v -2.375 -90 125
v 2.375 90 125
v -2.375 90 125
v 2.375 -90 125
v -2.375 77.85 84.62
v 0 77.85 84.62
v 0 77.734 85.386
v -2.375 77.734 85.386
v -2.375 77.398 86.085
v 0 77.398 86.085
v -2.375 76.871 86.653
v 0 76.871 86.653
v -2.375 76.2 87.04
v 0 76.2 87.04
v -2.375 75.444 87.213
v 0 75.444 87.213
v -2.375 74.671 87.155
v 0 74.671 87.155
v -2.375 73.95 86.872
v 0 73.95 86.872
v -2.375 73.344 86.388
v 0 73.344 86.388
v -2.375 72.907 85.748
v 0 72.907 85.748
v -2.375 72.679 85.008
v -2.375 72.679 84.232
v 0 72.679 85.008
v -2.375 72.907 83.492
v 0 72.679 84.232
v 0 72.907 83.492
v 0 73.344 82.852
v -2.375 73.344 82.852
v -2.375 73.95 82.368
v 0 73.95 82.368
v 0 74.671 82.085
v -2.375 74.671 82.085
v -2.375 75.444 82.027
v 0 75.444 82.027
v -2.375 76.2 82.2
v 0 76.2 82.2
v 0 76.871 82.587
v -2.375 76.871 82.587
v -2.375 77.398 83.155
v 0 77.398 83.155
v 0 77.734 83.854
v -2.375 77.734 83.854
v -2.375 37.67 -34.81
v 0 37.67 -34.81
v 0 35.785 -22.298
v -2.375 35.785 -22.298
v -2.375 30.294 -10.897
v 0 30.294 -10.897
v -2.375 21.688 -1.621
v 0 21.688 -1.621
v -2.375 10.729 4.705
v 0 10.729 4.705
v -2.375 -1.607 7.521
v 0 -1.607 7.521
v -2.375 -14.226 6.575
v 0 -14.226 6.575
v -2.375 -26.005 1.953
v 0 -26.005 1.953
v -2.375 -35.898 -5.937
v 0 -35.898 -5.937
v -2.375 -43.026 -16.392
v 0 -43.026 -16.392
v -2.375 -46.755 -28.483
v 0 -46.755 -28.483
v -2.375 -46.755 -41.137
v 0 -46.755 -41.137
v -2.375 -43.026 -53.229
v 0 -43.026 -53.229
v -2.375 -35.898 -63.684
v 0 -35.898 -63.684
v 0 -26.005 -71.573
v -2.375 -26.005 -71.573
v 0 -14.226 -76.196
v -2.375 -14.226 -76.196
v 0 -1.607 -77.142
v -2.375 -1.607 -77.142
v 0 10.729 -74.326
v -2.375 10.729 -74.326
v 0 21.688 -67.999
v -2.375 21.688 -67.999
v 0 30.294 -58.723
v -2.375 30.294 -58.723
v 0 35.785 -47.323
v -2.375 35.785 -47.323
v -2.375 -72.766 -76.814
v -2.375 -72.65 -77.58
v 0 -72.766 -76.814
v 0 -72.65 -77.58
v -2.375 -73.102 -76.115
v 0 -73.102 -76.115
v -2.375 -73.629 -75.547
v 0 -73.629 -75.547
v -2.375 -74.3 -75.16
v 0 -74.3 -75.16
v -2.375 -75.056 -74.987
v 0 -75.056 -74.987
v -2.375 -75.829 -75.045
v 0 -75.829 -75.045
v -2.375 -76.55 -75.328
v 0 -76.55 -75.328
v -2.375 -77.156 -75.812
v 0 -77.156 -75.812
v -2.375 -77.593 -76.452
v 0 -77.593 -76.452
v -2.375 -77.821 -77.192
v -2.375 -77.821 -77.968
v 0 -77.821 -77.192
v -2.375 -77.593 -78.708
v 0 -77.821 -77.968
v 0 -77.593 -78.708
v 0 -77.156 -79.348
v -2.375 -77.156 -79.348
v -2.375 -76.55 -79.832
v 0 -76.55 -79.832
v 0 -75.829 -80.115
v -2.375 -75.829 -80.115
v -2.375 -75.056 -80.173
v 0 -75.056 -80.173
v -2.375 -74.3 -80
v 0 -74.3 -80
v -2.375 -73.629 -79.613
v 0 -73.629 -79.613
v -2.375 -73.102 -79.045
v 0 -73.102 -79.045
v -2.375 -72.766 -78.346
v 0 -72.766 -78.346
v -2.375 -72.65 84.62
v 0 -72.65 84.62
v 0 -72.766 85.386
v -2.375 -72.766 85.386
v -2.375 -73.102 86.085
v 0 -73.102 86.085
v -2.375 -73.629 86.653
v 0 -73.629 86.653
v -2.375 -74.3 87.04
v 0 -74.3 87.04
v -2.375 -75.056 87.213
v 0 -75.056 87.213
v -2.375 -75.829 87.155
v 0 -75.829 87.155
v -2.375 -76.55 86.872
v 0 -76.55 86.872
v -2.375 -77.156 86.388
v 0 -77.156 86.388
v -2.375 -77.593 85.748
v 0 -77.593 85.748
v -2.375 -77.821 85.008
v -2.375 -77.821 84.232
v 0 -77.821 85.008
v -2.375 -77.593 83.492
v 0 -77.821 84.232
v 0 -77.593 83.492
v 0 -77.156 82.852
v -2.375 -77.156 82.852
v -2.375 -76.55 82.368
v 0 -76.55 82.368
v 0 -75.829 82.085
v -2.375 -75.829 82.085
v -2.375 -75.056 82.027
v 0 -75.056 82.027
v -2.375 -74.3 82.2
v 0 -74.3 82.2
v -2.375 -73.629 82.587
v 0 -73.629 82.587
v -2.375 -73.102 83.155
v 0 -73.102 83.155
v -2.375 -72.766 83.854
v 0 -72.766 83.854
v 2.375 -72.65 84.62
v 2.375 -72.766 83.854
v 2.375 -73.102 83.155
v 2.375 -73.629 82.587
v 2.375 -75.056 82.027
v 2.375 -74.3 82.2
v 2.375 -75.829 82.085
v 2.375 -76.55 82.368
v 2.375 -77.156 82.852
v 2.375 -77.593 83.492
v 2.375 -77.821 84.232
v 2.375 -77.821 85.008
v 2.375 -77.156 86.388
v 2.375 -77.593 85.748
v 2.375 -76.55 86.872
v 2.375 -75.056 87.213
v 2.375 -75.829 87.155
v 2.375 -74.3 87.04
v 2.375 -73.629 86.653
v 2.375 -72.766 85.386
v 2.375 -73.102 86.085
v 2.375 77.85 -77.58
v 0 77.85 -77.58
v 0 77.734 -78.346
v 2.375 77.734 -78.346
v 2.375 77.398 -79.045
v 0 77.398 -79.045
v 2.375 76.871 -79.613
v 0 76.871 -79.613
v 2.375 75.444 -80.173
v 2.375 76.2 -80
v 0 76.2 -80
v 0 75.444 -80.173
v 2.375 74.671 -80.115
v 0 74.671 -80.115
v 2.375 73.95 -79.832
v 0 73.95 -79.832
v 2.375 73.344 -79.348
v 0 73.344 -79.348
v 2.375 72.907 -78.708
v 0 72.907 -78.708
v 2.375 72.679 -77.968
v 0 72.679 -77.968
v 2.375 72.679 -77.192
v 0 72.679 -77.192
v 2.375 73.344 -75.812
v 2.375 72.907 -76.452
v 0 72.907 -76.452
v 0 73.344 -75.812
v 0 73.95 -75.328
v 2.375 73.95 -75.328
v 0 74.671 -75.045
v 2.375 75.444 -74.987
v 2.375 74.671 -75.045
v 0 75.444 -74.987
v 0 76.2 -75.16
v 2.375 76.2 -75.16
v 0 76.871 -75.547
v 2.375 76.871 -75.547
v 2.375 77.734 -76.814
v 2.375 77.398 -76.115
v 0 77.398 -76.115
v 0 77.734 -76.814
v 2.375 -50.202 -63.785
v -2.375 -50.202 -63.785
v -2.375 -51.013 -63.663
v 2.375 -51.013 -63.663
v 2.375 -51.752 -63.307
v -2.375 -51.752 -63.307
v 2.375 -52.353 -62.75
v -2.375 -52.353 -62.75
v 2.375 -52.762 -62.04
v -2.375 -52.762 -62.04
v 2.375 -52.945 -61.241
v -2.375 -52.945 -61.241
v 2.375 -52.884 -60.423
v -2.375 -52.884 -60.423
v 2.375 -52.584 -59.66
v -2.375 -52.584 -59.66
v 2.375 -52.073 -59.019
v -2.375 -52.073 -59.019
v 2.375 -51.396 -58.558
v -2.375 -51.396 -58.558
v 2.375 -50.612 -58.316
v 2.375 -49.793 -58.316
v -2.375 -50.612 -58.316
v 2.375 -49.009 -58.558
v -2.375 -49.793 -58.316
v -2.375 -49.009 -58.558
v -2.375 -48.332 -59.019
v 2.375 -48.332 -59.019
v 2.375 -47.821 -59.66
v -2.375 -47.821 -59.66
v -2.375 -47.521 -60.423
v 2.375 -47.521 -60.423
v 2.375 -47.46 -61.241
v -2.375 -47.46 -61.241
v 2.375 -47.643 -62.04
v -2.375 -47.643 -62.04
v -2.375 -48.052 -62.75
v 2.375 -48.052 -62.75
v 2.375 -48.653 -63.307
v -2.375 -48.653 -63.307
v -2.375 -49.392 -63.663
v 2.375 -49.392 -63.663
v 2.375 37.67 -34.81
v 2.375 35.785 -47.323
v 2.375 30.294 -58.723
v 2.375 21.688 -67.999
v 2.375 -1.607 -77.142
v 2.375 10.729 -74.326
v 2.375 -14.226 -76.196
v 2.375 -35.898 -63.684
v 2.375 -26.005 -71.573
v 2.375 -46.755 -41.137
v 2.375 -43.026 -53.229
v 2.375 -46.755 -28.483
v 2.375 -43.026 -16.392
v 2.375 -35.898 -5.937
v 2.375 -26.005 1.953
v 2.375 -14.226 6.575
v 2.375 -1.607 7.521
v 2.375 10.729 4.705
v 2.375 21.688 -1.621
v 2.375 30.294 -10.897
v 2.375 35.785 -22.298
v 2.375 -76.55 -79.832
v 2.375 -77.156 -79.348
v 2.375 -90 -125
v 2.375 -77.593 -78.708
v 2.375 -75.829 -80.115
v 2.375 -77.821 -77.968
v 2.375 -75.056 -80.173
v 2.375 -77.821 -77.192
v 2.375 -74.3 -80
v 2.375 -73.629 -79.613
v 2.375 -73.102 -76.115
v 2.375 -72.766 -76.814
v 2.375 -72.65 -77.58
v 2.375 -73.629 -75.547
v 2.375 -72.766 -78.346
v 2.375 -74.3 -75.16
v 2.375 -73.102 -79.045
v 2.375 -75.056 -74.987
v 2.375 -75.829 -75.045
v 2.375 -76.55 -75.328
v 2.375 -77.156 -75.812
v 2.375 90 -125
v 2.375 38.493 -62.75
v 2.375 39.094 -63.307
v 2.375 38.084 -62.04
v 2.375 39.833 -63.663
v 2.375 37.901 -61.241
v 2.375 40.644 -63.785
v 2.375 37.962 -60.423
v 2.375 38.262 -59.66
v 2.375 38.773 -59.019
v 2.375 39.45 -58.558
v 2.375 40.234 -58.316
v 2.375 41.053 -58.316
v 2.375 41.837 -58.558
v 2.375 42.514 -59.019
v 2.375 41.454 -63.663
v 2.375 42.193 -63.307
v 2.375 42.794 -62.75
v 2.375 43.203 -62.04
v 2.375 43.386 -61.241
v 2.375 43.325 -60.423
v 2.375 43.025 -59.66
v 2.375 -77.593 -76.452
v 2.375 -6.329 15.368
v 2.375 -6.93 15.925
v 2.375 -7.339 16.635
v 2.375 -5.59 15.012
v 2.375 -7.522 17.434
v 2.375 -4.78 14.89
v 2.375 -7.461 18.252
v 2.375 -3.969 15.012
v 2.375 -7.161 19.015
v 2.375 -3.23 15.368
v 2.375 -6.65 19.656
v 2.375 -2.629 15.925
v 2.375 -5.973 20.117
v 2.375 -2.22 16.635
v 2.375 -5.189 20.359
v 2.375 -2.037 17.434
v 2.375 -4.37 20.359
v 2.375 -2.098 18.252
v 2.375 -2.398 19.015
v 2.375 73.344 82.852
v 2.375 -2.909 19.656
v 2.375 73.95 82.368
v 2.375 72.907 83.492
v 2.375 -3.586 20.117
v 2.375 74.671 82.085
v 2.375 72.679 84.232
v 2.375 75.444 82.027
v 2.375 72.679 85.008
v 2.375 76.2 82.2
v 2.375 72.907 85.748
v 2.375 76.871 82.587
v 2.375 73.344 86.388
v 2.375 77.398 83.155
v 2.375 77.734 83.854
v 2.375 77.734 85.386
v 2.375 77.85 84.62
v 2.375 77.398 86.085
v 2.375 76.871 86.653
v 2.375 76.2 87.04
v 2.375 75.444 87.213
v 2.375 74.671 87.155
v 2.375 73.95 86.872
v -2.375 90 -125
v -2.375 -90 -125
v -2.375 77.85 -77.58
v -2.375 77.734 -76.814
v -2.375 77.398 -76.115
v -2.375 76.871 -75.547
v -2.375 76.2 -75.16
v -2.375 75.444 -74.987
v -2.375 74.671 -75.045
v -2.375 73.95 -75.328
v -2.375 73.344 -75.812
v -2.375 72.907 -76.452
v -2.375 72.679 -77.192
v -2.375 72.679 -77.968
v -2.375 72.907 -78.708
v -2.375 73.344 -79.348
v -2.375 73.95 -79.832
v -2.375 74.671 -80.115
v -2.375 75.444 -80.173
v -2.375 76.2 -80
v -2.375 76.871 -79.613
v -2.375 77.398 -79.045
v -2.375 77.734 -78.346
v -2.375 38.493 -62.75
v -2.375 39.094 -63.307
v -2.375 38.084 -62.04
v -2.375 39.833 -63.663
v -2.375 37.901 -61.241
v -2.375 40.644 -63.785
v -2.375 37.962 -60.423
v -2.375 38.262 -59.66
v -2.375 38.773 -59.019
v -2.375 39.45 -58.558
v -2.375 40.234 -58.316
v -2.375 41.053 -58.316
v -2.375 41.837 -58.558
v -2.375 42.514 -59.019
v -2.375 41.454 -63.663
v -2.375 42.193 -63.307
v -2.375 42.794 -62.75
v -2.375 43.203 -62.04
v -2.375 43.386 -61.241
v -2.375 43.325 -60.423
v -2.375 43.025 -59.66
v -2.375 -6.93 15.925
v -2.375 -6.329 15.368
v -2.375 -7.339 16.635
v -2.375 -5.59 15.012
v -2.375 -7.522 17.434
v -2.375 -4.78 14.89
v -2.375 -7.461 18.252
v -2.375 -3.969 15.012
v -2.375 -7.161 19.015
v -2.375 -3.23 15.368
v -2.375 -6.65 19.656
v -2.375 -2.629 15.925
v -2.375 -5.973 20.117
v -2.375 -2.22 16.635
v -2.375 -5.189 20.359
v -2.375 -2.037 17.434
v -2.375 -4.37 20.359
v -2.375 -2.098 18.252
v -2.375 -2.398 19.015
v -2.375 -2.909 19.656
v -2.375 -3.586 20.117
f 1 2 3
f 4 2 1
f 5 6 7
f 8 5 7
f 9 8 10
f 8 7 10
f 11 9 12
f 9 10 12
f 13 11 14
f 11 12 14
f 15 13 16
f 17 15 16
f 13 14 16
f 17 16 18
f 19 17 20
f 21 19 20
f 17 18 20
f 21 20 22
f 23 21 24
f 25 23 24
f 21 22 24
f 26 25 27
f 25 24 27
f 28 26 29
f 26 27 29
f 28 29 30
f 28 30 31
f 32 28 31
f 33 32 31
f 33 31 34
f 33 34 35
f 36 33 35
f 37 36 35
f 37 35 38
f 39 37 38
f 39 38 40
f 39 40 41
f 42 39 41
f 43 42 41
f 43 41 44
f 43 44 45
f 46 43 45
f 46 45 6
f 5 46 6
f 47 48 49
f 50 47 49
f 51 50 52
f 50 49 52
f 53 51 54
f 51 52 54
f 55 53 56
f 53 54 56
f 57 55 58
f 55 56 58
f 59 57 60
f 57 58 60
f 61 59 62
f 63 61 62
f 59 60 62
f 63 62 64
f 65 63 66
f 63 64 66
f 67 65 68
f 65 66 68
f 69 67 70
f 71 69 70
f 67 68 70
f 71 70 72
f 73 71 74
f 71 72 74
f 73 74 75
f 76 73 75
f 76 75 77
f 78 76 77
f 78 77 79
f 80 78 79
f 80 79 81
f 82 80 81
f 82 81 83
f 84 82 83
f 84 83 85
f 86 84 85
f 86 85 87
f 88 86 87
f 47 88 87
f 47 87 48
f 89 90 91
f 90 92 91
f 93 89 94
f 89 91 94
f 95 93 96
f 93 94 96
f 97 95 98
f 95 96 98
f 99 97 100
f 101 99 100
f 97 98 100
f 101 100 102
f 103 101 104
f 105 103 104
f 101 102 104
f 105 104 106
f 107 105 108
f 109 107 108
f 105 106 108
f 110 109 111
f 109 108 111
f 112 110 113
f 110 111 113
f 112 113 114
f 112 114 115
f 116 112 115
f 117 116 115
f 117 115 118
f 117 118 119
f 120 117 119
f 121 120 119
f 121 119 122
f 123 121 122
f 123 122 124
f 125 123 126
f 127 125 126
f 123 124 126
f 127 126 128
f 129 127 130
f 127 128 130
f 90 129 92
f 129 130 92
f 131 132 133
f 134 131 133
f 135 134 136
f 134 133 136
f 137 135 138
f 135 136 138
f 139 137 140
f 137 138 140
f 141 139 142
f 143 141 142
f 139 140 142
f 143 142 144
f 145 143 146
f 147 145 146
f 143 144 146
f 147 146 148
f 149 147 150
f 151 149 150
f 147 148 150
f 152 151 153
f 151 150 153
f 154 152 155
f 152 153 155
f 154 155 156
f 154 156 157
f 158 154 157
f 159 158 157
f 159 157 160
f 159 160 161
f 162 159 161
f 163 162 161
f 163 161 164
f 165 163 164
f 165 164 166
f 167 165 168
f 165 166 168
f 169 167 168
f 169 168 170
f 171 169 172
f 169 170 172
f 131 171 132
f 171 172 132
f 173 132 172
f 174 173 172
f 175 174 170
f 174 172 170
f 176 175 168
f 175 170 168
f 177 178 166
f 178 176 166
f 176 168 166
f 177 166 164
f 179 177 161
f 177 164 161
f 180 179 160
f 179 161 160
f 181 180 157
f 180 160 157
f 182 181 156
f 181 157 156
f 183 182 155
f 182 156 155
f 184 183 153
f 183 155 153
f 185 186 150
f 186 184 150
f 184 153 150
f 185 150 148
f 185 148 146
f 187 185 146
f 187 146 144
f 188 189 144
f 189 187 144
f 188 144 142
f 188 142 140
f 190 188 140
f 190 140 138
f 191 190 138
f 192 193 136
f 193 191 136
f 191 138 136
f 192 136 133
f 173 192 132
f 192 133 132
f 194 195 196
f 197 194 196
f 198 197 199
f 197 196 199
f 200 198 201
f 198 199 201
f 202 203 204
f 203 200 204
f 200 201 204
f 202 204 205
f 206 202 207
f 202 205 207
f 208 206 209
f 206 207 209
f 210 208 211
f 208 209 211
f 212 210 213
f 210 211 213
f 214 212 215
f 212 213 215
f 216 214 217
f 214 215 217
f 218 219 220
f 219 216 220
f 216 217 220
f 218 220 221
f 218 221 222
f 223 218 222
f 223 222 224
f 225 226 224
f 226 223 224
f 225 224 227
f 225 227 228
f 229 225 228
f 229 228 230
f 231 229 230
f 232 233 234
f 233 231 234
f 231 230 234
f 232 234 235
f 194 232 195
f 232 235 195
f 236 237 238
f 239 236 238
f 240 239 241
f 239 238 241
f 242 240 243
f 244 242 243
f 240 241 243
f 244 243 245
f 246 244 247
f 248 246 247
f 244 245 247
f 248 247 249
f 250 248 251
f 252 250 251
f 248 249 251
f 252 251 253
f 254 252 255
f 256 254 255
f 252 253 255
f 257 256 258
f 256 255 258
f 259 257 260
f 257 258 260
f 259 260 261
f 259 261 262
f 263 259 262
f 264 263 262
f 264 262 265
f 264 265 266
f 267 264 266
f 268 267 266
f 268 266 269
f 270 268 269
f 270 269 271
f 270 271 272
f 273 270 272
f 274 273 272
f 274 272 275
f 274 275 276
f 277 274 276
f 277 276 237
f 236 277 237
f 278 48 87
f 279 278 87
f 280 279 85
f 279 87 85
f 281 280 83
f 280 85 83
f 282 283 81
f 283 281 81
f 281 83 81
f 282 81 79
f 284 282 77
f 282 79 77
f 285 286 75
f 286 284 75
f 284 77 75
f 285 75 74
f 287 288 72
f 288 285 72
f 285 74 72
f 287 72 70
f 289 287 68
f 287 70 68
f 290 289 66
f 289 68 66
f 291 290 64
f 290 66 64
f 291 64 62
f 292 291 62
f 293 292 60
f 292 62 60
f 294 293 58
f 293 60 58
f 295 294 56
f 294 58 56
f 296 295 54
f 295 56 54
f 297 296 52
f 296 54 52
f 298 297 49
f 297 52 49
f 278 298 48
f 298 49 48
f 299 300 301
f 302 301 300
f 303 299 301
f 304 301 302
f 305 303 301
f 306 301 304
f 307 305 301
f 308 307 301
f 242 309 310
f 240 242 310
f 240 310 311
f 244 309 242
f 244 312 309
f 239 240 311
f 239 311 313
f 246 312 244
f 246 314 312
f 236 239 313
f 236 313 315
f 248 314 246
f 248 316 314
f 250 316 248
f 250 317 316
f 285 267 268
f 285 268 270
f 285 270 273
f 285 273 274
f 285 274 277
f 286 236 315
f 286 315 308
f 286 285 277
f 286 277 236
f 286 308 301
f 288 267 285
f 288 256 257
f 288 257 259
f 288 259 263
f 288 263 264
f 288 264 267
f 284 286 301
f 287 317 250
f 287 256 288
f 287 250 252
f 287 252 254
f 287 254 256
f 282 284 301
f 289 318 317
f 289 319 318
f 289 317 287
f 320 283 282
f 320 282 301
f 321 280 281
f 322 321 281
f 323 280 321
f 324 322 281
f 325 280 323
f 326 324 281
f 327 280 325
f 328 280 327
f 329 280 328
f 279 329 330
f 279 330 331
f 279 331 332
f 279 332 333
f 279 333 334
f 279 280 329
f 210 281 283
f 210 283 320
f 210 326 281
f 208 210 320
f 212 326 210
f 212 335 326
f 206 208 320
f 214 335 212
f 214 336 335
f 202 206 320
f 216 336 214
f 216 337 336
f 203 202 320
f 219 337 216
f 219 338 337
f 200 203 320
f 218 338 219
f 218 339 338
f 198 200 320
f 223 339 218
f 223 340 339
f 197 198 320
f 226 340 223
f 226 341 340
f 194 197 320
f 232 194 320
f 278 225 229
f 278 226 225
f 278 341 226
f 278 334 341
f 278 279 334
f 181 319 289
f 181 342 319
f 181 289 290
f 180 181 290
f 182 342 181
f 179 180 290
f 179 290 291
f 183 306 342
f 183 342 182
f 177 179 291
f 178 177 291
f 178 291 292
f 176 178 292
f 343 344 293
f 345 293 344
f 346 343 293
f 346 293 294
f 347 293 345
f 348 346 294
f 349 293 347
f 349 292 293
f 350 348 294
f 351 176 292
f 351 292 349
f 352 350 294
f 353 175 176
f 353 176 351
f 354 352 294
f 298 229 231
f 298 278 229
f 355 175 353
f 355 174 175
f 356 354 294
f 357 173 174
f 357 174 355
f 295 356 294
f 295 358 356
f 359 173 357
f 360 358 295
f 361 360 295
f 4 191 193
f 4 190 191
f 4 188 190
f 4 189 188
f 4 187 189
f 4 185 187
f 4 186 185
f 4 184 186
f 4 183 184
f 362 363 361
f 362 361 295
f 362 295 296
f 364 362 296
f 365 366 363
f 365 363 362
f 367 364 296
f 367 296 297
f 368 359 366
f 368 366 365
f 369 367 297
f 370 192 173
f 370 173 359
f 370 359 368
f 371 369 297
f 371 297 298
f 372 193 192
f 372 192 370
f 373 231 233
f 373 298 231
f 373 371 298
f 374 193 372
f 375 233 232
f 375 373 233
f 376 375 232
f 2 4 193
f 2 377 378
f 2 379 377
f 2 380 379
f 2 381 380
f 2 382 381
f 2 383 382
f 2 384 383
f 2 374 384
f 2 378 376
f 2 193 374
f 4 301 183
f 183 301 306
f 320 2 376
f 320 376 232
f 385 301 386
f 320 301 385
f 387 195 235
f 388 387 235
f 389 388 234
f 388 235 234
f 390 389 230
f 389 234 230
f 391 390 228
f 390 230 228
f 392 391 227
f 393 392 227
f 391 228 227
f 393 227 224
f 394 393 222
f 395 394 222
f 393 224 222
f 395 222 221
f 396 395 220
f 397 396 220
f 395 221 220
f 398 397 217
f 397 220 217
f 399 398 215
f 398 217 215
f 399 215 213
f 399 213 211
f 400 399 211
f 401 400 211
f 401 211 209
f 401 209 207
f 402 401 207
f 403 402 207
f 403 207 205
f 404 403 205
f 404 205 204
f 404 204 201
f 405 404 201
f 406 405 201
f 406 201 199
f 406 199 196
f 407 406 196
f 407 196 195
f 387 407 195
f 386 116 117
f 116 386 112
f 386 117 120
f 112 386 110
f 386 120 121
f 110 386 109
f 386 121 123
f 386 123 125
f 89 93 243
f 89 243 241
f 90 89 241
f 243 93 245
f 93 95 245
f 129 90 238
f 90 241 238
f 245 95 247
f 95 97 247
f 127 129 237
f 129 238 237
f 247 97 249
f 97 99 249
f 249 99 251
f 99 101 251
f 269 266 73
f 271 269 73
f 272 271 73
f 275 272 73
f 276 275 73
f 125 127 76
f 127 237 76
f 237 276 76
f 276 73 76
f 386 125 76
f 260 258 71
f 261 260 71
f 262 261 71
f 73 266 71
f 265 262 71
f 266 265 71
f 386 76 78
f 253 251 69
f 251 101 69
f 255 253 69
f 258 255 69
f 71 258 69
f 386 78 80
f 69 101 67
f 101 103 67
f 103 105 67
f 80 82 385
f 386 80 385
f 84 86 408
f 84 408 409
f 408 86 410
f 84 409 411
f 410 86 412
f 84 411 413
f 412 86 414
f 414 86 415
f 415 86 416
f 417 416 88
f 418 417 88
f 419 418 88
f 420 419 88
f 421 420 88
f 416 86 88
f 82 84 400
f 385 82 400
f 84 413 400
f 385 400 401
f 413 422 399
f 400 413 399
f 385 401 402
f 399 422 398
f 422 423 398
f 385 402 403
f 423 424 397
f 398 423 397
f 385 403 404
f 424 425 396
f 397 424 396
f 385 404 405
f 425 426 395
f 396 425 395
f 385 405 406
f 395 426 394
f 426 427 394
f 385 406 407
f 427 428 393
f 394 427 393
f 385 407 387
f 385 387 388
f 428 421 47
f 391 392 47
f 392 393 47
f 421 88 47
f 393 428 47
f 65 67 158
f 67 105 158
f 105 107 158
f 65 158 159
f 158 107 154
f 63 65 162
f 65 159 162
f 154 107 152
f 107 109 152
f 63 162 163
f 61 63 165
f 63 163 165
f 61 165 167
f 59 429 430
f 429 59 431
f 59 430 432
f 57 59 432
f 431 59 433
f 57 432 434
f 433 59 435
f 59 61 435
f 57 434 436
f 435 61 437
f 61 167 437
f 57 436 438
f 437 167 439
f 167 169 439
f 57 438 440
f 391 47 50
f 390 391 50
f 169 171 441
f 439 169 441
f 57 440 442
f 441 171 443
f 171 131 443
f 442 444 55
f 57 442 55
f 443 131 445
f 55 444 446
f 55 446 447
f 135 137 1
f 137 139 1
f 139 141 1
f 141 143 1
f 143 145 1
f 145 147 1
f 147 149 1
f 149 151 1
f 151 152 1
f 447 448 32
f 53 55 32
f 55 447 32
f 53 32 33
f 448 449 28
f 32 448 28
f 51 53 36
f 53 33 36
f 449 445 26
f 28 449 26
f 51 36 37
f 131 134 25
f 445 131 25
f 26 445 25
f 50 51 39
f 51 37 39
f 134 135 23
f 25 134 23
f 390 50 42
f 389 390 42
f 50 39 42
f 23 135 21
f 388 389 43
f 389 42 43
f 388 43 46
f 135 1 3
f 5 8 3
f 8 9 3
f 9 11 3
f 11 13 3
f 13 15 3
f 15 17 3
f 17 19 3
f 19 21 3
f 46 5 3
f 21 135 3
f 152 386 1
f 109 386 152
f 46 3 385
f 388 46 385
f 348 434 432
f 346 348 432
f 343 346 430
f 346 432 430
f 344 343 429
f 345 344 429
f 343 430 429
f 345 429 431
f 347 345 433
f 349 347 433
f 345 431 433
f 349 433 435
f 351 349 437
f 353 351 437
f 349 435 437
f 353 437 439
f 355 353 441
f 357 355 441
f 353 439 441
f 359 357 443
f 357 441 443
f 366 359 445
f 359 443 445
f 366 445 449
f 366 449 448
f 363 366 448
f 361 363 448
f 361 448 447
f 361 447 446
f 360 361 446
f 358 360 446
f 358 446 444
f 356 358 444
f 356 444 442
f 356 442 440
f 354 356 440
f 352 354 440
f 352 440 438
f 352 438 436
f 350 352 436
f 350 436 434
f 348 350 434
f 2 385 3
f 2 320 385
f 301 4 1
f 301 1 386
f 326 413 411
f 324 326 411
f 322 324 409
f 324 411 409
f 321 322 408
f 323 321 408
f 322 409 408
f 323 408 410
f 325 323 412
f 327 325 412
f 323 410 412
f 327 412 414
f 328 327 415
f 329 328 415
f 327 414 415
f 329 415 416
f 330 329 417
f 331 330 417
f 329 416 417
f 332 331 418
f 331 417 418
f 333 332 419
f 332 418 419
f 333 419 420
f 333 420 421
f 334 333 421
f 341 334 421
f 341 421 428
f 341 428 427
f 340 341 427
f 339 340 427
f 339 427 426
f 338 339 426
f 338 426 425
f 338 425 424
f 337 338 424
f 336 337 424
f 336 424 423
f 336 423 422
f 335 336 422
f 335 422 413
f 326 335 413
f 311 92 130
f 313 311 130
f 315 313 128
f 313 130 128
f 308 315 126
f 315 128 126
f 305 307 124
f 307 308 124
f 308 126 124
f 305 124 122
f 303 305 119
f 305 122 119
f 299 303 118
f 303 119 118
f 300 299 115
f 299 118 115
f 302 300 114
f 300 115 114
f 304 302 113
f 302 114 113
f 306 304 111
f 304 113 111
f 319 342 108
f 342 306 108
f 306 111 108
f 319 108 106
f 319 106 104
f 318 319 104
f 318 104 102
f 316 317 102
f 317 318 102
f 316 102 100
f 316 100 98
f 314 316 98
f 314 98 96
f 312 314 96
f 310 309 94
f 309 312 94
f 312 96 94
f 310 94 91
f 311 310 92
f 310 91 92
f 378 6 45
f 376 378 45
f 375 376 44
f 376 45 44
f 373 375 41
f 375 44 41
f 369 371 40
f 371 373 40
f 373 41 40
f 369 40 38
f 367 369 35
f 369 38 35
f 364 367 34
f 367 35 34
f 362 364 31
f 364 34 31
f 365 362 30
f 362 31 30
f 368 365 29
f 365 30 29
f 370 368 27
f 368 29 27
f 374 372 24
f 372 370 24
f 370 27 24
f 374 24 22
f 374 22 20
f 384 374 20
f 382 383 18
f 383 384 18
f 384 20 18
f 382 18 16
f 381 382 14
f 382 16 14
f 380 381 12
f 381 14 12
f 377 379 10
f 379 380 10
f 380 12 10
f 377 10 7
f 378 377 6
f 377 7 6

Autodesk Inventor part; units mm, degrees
ref_plane "YZ Plane" through (0, 0, 0) normal (1, 0, 0) x (0, 1, 0)
ref_plane "XZ Plane" through (0, 0, 0) normal (0, 1, 0) x (-1, 0, 0)
ref_plane "XY Plane" through (0, 0, 0) normal (0, 0, 1) x (1, 0, 0)
sketch "Face" plane through (0, 0, 0) normal (0, 0, 1) x (1, 0, 0)
  circle A0 centre (143.9602, -80.6846) radius 6.35
  circle A1 centre (39.7975, -186.0352) radius 2.4
  circle A2 centre (85.2205, -107.3602) radius 2.4
  circle A3 centre (130.6435, -186.0352) radius 2.4
  circle A4 centre (85.2205, -159.8102) radius 42.45
  circle A5 centre (14.75, -202.58) radius 2.6
  circle A6 centre (165.25, -202.58) radius 2.6
  circle A7 centre (14.75, -40.38) radius 2.6
  circle A8 centre (165.25, -40.38) radius 2.6
  line L0 (180, 0) -> (0, 0)
  line L1 (0, 0) -> (0, -250)
  line L2 (0, -250) -> (180, -250)
  line L3 (180, -250) -> (180, 0)
  point P0 (94.9979, -134.0949)
  point P1 (175.25, -245.25)
sketch "Sketch1" plane through (0, 0, 0) normal (1, 0, 0) x (0, 1, 0)
  circle A0 centre (53.9602, 44.3154) radius 6.35
  circle A1 centre (-50.2025, -61.0352) radius 2.4
  circle A2 centre (-4.7795, 17.6398) radius 2.4
  circle A3 centre (40.6435, -61.0352) radius 2.4
  circle A4 centre (-4.7795, -34.8102) radius 42.45
  circle A5 centre (-75.25, -77.58) radius 2.6
  circle A6 centre (75.25, -77.58) radius 2.6
  circle A7 centre (-75.25, 84.62) radius 2.6
  circle A8 centre (75.25, 84.62) radius 2.6
  line L0 (90, 125) -> (-90, 125)
  line L1 (-90, 125) -> (-90, -125)
  line L2 (-90, -125) -> (90, -125)
  line L3 (90, -125) -> (90, 125)
  point P0 (0, 0)
  point P1 (-90, 0)
  point P2 (0, 125)
extrude "Extrusion1" add sketch "Sketch1" along normal mid plane 4.75 contours A0 | L3 L2 L1 L0
sketch "Sketch2" plane through (2.375, 0, 0) normal (1, 0, 0) x (0, 0, -1)
  circle A0 centre (-17.6398, -4.7795) radius 2.4 projected
  circle A1 centre (61.0352, -50.2025) radius 2.4 projected
  circle A2 centre (61.0352, 40.6435) radius 2.4 projected
  point P0 (0, 0)
hole "Hole1" at (2.375, -4.7795, 17.6398) at (2.375, -50.2025, -61.0352) at (2.375, 40.6435, -61.0352) direction (-1, 0, 0) diameter 5.5 end through all clearance for "Socket Head Cap Screw" size "M5" standard "Ansi Metric M Profile"
properties part number "BREEZE-M08"
